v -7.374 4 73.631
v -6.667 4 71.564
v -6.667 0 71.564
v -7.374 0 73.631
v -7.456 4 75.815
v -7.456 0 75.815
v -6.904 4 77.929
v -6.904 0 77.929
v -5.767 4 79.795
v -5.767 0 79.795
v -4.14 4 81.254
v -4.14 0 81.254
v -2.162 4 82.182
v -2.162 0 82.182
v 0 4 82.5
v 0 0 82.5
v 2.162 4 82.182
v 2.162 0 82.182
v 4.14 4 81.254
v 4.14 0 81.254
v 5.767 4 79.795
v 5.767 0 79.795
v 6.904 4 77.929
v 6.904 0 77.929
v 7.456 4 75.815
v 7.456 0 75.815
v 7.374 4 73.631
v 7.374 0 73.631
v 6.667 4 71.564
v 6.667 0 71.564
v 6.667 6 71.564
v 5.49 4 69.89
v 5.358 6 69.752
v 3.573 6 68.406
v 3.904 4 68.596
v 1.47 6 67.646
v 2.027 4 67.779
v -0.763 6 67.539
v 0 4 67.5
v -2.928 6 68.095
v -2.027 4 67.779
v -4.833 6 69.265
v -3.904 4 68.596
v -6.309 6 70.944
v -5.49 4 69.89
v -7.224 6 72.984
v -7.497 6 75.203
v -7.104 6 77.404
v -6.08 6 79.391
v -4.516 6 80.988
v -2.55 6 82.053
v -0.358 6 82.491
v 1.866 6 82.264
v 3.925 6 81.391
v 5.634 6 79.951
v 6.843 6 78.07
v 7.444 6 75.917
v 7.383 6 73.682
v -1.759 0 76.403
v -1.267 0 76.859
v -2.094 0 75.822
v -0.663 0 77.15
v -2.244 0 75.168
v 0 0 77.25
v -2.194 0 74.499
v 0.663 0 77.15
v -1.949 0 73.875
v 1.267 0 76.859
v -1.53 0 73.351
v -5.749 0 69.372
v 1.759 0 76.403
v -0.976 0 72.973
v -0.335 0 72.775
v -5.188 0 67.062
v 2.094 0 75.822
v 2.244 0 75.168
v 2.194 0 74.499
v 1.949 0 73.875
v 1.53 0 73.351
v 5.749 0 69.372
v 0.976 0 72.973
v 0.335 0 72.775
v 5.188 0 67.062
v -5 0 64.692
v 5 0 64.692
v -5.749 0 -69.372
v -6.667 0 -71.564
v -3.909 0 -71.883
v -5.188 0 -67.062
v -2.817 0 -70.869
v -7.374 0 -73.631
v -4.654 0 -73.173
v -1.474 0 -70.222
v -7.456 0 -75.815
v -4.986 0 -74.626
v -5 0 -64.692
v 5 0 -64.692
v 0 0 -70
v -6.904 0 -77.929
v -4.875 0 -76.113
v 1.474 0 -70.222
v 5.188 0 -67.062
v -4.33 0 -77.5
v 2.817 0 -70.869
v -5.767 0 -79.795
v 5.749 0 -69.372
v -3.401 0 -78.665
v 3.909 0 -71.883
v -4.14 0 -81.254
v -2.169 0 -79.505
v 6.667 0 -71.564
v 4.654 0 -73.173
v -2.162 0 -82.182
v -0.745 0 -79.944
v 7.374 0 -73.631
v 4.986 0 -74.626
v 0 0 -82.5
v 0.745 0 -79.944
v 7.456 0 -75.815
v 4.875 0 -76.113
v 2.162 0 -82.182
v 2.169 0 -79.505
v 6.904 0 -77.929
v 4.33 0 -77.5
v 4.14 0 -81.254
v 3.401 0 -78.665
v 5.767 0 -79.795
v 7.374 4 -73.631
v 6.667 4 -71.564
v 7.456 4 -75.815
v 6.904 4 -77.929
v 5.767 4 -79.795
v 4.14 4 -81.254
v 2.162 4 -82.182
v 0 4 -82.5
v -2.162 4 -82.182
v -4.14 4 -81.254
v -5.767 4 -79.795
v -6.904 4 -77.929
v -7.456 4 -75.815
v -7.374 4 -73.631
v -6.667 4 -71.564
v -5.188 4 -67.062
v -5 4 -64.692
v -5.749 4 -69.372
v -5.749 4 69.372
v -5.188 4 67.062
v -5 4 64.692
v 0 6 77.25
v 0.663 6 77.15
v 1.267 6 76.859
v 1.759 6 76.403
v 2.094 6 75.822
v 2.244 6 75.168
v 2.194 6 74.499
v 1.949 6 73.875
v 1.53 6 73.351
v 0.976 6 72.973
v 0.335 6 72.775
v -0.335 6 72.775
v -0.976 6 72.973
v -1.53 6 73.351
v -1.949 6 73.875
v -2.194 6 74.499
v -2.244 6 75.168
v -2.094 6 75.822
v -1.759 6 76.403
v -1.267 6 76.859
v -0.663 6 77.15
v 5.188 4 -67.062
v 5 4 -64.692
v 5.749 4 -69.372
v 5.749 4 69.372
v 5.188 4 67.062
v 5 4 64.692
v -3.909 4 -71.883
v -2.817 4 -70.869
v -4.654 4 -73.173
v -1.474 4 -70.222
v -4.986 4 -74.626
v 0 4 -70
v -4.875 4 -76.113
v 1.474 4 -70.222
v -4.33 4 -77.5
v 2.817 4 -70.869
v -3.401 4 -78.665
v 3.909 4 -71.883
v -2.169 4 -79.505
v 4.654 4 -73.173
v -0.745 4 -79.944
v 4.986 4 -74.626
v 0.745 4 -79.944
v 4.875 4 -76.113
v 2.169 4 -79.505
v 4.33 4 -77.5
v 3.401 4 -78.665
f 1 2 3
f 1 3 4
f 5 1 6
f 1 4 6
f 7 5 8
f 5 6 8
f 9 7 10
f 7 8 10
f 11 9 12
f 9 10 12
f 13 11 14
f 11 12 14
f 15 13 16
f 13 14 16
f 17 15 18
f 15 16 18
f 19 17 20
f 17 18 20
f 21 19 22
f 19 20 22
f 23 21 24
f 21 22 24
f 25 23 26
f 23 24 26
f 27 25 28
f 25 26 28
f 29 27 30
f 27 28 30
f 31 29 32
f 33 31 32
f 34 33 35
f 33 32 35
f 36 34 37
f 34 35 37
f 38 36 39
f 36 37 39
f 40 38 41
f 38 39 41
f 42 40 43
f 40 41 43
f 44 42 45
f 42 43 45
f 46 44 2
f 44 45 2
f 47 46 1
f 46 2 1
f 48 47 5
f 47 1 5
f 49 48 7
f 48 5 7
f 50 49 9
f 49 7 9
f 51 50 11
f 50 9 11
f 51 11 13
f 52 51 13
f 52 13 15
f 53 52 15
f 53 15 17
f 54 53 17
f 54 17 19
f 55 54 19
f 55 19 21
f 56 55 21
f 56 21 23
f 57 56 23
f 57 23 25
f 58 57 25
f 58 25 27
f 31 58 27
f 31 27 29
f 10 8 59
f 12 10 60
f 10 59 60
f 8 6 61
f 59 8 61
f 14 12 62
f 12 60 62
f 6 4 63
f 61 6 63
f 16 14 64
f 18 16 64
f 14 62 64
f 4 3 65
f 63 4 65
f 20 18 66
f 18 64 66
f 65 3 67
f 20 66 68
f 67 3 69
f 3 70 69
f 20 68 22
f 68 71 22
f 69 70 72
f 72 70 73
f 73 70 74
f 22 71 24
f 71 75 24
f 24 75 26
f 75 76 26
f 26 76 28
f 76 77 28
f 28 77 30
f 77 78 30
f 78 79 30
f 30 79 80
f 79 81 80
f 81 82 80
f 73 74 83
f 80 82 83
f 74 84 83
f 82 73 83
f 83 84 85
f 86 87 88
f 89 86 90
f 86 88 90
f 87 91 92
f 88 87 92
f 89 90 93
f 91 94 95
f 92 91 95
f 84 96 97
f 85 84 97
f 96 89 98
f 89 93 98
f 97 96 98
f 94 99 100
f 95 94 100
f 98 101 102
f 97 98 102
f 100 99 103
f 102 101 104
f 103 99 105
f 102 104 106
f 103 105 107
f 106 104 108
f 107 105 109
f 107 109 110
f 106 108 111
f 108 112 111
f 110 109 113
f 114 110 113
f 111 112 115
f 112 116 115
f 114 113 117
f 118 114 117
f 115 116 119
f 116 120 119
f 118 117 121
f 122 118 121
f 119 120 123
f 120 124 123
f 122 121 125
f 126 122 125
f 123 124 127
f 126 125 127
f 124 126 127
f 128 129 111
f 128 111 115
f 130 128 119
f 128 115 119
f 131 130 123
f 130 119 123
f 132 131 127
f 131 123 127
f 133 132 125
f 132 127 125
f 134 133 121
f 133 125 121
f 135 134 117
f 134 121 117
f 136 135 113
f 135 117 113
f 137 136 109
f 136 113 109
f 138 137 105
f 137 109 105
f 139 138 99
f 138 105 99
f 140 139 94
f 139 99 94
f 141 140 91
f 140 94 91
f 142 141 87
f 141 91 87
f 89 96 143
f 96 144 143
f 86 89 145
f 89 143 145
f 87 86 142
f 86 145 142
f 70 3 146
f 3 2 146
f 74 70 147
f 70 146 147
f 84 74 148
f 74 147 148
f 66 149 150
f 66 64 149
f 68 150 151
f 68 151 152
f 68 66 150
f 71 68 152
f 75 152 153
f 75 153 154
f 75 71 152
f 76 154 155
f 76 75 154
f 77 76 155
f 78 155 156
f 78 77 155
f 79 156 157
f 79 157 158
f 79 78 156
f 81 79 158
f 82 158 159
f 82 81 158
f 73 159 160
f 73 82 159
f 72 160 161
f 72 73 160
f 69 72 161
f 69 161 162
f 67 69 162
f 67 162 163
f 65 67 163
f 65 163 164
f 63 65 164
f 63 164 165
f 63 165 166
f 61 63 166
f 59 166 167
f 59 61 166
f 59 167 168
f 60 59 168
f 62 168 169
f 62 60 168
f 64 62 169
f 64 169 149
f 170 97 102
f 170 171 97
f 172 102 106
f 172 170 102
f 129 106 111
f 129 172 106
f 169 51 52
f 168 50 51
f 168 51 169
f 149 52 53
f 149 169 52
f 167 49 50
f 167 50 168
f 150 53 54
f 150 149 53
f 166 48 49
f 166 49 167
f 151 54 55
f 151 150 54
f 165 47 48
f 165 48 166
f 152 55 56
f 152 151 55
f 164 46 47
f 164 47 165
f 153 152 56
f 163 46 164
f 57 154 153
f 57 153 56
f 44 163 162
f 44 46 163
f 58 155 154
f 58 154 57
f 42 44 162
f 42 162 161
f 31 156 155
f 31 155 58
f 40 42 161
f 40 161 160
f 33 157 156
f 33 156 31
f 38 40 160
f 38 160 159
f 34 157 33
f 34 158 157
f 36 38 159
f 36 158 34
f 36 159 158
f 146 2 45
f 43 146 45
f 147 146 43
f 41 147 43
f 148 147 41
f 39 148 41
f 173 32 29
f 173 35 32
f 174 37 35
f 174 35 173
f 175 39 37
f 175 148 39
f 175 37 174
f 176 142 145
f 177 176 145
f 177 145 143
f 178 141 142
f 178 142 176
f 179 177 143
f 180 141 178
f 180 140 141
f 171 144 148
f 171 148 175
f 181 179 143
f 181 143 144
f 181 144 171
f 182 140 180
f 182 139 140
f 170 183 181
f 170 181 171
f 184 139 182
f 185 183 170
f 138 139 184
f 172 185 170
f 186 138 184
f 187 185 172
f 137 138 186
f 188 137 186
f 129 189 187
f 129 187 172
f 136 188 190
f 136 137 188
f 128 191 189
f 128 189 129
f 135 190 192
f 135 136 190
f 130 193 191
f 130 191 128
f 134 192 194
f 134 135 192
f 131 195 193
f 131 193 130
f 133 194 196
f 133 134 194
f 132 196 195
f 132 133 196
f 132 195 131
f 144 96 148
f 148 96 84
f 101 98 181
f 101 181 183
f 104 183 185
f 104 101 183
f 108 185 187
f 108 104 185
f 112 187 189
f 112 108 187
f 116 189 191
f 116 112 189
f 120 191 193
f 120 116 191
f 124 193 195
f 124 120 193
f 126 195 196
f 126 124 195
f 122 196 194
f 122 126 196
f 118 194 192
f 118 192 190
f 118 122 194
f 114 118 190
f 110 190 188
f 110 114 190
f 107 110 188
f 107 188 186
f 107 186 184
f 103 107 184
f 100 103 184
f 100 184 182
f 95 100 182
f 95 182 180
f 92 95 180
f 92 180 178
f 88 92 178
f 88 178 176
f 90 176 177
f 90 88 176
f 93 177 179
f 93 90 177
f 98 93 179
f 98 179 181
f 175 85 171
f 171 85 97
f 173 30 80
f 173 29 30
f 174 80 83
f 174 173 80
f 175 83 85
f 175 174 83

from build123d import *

# Parameters (mm, degrees)
SKETCH1_R           = 2.25
SKETCH1_R_2         = 5
BOSS_EXTRUDE1_DEPTH = 4
FILLET1_R           = 15
SKETCH2_R           = 7.5
SKETCH2_R_2         = 2.25
BOSS_EXTRUDE2_DEPTH = 2


with BuildPart() as part:
    # Sketch1 → Boss-Extrude1 (new body)
    with BuildSketch(Plane(origin=(0, 0, 0), x_dir=(1, 0, 0), z_dir=(0, 1, 0))):
        with BuildLine():
            ThreePointArc((-5, -69.409830056), (0, -82.5), (5, -69.409830056))
            Line((5, -69.409830056), (5, 69.409830056))
            ThreePointArc((5, 69.409830056), (0, 82.5), (-5, 69.409830056))
            Line((-5, 69.409830056), (-5, -69.409830056))
        make_face()
        with Locations(Location((0, -75, 0), (0, 0, 270))):
            Circle(SKETCH1_R, mode=Mode.SUBTRACT)
        with Locations(Location((0, 75, 0), (0, 0, 270))):
            Circle(SKETCH1_R_2, mode=Mode.SUBTRACT)
    extrude(amount=BOSS_EXTRUDE1_DEPTH)

    # Fillet1
    fillet1_edges = [part.edges().sort_by_distance(p)[0] for p in [
        (-5, 2, 69.409830056),
        (-5, 2, -69.409830056),
        (5, 2, -69.409830056),
        (5, 2, 69.409830056),
    ]]
    fillet(fillet1_edges, radius=FILLET1_R)

    # Sketch2 → Boss-Extrude2 (add)
    with BuildSketch(Plane(origin=(0, 4, 0), x_dir=(1, 0, 0), z_dir=(0, 1, 0))):
        with Locations(Location((0, -75, 0), (0, 0, 27.266044451))):
            Circle(SKETCH2_R)
        with Locations(Location((0, -75, 0), (0, 0, 270))):
            Circle(SKETCH2_R_2, mode=Mode.SUBTRACT)
    extrude(amount=BOSS_EXTRUDE2_DEPTH)


solid = part.part
